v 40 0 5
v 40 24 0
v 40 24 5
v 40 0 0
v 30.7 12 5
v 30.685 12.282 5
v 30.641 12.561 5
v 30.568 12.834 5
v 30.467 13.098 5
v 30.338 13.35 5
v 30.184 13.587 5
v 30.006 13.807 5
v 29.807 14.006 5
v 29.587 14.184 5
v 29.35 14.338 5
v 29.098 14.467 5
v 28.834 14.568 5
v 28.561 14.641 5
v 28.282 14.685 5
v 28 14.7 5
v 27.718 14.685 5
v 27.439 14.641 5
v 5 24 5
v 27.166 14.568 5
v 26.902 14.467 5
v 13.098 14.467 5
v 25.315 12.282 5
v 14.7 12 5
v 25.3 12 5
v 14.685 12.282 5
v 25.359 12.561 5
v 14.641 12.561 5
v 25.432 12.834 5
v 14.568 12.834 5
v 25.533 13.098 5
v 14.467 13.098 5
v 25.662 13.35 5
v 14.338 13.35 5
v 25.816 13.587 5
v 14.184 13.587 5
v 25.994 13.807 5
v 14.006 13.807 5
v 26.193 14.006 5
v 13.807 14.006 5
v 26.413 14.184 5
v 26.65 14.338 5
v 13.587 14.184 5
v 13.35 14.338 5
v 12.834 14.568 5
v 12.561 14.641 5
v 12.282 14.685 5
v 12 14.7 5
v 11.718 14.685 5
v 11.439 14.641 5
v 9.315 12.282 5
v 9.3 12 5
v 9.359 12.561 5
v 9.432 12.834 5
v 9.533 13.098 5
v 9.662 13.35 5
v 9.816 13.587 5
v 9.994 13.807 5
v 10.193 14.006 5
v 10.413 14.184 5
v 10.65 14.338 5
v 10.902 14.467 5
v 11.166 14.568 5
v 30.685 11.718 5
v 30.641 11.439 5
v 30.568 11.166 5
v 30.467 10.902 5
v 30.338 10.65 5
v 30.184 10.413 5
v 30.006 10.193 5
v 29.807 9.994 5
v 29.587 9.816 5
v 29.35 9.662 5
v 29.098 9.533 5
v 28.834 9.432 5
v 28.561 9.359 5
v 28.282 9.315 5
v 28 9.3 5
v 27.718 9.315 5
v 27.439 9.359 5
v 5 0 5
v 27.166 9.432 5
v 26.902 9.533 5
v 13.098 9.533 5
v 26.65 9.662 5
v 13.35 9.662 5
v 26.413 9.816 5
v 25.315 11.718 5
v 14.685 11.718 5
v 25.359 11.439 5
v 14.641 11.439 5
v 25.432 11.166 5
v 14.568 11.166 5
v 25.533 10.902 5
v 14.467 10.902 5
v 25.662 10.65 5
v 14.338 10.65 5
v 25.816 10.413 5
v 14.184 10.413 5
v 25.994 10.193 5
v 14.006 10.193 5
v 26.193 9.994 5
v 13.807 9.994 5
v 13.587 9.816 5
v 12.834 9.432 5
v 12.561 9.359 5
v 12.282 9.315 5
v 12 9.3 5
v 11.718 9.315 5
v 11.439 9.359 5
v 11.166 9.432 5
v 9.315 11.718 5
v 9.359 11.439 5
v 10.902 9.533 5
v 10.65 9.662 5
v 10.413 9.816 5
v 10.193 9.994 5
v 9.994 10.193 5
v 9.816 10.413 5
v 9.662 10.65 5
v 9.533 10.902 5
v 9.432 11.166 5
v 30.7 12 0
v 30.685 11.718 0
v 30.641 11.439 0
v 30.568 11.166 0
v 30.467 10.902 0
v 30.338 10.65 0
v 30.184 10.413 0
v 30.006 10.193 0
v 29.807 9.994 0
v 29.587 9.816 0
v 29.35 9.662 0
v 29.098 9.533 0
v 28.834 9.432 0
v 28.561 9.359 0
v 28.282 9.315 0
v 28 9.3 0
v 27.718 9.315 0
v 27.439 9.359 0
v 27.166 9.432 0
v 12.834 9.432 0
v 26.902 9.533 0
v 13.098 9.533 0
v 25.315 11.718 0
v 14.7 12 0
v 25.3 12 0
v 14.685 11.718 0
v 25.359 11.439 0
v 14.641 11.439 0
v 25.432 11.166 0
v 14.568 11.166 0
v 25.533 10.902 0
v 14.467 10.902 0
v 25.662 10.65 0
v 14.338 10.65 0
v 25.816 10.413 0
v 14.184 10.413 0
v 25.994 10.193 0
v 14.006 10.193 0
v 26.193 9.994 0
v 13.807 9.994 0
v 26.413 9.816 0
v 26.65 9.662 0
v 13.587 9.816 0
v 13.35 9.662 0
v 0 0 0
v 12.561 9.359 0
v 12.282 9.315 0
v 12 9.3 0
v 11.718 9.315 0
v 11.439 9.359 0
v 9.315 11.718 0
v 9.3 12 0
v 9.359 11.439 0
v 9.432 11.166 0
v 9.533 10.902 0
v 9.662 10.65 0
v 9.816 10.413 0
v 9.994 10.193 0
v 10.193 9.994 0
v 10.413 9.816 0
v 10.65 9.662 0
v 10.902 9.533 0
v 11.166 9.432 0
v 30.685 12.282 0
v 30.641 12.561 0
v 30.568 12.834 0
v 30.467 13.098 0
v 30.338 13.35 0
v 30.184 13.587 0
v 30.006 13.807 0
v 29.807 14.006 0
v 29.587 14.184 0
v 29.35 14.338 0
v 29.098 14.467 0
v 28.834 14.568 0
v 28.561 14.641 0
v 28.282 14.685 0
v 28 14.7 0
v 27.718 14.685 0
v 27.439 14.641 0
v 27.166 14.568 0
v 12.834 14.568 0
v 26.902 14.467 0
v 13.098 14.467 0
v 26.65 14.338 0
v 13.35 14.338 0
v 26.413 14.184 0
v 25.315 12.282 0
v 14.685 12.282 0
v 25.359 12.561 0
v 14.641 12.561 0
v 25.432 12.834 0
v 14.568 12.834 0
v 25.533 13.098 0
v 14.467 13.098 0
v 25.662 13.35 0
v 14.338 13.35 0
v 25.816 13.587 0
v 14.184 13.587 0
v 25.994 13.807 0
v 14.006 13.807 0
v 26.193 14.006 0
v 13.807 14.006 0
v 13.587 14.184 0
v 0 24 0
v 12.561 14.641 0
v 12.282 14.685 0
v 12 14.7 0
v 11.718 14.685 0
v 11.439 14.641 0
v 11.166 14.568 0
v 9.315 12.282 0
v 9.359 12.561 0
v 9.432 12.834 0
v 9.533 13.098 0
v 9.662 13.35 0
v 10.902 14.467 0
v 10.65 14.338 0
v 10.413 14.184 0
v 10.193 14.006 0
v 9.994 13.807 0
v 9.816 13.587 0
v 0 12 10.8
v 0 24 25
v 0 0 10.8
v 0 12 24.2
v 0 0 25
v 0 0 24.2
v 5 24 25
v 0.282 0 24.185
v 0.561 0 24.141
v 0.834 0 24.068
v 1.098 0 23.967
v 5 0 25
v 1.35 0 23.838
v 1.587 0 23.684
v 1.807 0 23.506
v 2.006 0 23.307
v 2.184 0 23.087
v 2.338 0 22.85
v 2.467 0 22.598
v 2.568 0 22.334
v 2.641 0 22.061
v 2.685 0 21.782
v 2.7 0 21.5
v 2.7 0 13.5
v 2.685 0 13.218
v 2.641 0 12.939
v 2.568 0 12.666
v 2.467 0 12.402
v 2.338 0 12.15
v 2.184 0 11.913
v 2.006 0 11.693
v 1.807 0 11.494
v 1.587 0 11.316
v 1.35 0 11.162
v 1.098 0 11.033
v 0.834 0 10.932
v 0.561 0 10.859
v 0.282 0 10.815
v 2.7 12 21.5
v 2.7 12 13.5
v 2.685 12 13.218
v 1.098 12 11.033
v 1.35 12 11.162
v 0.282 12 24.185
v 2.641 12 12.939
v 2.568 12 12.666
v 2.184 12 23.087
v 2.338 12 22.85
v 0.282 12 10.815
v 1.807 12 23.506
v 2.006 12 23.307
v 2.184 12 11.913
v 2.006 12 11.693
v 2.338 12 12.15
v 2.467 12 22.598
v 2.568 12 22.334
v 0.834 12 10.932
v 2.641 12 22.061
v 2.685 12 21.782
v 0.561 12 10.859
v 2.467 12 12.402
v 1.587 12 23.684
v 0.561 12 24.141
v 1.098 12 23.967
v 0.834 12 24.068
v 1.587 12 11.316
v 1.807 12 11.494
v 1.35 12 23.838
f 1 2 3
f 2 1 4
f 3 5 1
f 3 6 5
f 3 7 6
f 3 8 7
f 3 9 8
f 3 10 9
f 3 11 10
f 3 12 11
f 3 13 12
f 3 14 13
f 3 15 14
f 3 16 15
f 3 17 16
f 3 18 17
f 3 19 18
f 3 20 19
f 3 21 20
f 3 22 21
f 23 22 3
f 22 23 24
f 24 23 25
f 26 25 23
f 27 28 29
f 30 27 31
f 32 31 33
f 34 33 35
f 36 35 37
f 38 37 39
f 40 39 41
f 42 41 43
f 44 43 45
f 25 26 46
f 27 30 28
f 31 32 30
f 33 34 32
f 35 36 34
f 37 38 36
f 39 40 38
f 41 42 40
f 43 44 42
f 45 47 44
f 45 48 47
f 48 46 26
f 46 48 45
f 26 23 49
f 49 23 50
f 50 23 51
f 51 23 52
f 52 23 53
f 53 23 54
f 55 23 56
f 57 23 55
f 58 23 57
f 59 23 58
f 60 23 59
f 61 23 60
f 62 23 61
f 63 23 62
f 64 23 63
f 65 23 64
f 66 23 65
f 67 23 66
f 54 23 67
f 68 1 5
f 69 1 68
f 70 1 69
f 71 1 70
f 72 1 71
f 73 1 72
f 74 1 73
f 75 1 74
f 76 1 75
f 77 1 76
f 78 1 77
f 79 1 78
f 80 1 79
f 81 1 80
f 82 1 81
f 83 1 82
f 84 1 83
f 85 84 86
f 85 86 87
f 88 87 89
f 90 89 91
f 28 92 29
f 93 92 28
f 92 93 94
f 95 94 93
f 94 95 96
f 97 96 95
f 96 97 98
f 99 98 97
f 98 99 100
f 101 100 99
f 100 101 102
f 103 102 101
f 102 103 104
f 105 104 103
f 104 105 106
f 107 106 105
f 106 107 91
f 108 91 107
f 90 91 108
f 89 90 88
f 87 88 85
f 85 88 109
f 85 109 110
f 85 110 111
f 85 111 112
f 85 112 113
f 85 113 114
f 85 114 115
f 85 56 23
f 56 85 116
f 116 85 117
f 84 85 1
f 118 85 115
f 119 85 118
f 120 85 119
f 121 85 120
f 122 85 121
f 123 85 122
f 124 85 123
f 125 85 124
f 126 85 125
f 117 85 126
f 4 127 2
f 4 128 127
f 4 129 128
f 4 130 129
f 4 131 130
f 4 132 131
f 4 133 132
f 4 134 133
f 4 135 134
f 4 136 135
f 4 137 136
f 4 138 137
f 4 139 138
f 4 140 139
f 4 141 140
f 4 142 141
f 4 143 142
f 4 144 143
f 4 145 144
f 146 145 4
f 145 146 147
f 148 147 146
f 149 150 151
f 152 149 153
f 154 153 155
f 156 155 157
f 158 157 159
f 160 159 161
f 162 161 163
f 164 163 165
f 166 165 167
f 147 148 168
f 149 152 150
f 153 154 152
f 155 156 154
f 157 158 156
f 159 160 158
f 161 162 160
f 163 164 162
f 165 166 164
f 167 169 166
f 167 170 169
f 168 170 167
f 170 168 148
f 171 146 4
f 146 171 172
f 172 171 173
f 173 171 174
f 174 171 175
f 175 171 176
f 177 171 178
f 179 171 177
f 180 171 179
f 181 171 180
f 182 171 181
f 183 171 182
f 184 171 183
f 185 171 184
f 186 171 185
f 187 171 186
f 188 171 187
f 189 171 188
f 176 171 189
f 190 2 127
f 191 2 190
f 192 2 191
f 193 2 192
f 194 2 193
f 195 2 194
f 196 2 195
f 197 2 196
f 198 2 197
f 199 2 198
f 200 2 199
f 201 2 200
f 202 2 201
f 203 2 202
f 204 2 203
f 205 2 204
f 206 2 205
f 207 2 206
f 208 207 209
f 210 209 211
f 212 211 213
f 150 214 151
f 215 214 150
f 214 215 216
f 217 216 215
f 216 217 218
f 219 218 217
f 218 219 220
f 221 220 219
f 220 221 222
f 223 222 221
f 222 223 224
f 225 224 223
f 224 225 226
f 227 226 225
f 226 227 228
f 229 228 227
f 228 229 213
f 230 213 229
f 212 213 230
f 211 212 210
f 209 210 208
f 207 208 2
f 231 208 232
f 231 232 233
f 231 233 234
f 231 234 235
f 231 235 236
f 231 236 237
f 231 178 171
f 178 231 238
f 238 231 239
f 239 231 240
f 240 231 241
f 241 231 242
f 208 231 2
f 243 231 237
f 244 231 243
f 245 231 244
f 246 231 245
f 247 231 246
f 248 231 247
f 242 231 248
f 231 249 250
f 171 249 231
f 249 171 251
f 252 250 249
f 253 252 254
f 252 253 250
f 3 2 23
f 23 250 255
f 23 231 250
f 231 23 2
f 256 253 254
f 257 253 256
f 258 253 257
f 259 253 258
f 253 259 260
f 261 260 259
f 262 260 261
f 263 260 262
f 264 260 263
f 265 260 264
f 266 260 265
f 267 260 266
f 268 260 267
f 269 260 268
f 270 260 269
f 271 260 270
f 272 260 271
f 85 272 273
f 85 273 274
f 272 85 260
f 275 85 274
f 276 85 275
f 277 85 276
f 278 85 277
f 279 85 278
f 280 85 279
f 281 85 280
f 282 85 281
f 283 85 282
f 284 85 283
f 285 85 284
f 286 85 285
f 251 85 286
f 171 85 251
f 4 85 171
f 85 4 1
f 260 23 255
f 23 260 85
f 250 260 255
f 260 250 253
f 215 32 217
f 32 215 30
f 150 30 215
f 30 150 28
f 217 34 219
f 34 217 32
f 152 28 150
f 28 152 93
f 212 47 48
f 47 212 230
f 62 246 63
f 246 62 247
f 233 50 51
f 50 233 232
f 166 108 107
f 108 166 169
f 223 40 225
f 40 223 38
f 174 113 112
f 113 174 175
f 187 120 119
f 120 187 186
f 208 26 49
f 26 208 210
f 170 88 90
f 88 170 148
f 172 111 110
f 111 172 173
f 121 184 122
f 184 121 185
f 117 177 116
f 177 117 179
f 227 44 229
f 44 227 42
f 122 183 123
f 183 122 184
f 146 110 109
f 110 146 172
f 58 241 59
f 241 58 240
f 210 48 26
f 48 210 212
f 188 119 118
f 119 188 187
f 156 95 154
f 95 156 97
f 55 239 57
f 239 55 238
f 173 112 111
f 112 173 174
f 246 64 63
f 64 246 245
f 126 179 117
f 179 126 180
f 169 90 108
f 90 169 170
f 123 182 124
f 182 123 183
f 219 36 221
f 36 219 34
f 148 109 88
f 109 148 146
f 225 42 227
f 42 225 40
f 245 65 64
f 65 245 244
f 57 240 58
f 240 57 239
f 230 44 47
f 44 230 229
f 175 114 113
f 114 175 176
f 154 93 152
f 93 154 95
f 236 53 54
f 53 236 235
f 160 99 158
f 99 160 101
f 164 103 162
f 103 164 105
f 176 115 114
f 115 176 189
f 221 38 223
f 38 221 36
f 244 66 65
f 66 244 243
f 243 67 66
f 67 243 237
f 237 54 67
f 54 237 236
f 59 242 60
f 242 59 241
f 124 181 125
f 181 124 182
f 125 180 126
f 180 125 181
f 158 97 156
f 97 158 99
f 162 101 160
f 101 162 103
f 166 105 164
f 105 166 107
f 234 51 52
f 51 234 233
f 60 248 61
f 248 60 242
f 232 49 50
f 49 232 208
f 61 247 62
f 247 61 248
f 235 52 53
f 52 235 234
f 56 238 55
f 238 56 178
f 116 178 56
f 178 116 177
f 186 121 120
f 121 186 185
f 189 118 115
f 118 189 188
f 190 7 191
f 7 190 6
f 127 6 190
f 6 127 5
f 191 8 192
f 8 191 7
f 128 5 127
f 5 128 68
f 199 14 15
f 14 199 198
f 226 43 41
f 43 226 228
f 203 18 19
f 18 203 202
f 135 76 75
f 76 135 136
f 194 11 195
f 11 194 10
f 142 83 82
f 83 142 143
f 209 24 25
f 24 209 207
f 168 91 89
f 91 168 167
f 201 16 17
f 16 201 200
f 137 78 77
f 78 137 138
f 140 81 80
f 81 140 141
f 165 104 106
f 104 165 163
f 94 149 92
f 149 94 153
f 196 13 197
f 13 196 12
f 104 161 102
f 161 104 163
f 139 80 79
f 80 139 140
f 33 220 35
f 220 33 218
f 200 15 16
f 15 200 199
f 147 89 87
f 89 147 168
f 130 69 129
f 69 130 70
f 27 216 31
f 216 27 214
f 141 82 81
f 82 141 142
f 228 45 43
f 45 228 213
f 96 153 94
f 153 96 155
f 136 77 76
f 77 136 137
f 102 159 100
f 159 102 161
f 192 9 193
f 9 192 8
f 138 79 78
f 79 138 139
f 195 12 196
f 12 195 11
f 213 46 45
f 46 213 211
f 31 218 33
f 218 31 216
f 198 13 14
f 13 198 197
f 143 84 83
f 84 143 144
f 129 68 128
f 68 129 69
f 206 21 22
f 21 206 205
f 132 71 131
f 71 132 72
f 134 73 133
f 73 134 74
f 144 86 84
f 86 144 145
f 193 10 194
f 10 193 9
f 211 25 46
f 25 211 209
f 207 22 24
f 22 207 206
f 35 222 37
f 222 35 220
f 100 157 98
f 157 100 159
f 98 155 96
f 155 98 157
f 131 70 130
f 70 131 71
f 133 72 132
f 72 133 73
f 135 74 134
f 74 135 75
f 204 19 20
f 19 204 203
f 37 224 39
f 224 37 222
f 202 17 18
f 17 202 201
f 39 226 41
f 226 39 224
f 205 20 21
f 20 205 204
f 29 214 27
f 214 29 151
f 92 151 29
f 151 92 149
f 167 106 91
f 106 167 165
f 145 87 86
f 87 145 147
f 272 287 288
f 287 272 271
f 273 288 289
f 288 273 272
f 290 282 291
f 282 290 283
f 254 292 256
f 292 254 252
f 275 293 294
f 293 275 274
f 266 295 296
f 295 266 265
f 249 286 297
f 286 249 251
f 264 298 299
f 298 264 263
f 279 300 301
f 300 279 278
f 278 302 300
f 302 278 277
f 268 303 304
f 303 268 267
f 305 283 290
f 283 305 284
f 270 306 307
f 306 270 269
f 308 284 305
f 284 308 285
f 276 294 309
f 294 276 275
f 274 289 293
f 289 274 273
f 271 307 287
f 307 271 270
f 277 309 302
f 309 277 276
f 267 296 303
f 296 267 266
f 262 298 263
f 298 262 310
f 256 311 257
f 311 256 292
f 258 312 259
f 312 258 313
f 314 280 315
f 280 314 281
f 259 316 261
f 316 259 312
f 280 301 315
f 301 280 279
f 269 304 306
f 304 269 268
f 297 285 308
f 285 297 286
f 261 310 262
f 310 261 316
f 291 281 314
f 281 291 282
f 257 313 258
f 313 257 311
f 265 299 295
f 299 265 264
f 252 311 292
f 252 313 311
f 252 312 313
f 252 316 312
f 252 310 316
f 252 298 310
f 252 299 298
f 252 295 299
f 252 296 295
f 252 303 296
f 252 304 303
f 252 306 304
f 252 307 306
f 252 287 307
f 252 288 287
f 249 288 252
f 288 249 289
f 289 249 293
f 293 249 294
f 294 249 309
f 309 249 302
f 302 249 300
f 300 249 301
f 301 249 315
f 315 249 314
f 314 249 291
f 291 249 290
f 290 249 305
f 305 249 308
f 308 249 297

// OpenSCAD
// Adjustable L bracket with upright slot.
$fn = 60;
eps = 0.02;
base_l = 40;
upright_h = 25;
width = 24;
thickness = 5;
slot_l = 8;
module vertical_slot() { hull() { translate([0,width/2,thickness+upright_h/2-slot_l/2]) rotate([90,0,0]) cylinder(d=5.4,h=width+2*eps); translate([0,width/2,thickness+upright_h/2+slot_l/2]) rotate([90,0,0]) cylinder(d=5.4,h=width+2*eps); } }
difference() {
    union() { cube([base_l,width,thickness]); cube([thickness,width,upright_h]); }
    for(x=[12,base_l-12]) translate([x,width/2,-eps]) cylinder(d=5.4,h=thickness+2*eps);
    vertical_slot();
}
